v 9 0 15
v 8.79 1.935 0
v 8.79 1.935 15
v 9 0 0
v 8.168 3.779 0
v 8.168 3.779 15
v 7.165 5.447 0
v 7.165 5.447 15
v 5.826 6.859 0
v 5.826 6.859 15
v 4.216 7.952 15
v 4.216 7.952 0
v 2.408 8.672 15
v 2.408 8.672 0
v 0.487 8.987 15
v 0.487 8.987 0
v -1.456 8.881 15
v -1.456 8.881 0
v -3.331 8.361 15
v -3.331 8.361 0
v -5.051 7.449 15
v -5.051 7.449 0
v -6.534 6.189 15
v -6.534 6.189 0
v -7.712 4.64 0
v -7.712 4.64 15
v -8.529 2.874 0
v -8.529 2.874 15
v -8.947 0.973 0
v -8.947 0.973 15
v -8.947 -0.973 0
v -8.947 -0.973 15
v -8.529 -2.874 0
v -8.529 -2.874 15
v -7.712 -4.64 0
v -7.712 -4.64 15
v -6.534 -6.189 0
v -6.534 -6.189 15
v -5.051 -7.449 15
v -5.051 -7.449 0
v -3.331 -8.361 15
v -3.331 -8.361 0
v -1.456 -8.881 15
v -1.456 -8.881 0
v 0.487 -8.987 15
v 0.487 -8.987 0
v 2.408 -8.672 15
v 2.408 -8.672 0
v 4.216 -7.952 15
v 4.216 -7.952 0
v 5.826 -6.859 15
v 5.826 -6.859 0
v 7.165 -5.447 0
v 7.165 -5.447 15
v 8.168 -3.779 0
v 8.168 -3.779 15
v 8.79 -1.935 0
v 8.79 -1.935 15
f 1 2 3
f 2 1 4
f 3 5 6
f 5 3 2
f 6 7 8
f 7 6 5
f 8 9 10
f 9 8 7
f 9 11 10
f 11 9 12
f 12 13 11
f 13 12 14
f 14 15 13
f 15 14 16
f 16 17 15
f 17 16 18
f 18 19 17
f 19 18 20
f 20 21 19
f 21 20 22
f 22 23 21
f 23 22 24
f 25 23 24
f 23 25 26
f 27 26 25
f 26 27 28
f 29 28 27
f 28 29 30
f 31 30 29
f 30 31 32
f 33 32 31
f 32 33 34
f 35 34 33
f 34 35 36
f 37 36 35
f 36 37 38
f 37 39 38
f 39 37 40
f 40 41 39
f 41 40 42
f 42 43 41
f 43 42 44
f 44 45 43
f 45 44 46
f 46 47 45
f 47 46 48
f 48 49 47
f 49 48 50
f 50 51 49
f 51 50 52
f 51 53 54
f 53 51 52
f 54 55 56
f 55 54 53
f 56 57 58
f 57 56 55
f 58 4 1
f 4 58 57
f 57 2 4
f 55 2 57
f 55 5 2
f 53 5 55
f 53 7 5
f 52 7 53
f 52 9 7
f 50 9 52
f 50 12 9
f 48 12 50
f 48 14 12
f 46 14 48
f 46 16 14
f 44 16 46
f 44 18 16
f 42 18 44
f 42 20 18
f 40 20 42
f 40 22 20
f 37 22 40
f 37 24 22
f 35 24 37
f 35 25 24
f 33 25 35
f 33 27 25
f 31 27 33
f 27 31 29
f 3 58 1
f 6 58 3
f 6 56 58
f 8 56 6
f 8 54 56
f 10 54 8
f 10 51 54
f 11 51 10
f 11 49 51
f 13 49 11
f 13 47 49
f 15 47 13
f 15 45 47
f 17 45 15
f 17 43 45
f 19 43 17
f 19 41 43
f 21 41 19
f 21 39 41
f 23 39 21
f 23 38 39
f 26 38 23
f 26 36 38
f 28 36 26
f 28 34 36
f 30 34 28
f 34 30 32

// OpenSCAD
// Generated by SolidPython 1.0.1 on 2020-07-29 00:46:44


cylinder(h = 15, r1 = 9, r2 = 9);
/***********************************************
*********      SolidPython code:      **********
************************************************
 
# import packages: SolidPython
from solid import *
from solid.utils import *
from itertools import chain, combinations, permutations


class Resize:

    def __init__(self, scad_file):
        self.scad_file = scad_file
        #self.scad_file = import_scad(scad_file)
        # cone/cylinder param:
        self.r1 = 0
        self.r2 = 0
        self.h = 0
        # rectangular prism param:
        self.w = 0
        self.l = 0
        # ellipse param:
        self.r = 0

    # import OpenScad code (file name corresponds to shape)


    # classify shape + parameters
    def assign(self, param1, param2, param3):
        if self.scad_file == 'cone.scad':
            self.r1 = param1
            self.r2 = param2
            self.h = param3
        elif self.scad_file == 'cylinder.scad':
            self.r1 = param1
            self.r2 = param2
            self.h = param3
        elif self.scad_file == 'rectangularPrism.scad':
            self.h = param1
            self.l = param2
            self.w = param3
        else:
            self.r = param1
            self.h = param2

    # resize parameters
    def iterate(self):
        x = range(3, 20, 2)
        i = 1
        if self.scad_file == 'cone.scad':
            tempList = list(permutations(x, 2))
            for temp in tempList:
                param1 = temp[0]
                param2 = temp[1]
                filepath = 'produced_scad_files/' + 'cone' + str(param1) + '_' + str(param2) + '_' + '.scad'
                scad_render_to_file(cylinder(h=param1, r1=param2, r2=0), filepath)

        elif self.scad_file == 'cylinder.scad':
            tempList = list(permutations(x, 3))
            for temp in tempList:
                param1 = temp[0]
                param2 = temp[1]
                filepath = 'produced_scad_files/' + 'cylinder' + str(param1) + '_' + str(param2) + '_' + '.scad'
                scad_render_to_file(cylinder(h=param1, r1=param2, r2=param2), filepath)

        elif self.scad_file == 'rectangularPrism.scad':
            tempList = list(permutations(x, 3))
            for temp in tempList:
                param1 = temp[0]
                param2 = temp[1]
                param3 = temp[2]
                filepath = 'produced_scad_files/' + 'rectangularPrism' + str(param1) + '_' + str(param2) + '_' + str(
                    param3) + '.scad'
                scad_render_to_file(cube(size=(param1, param2, param3)), filepath)

        elif self.scad_file == 'ellipse.scad':
            tempList = list(permutations(x, 4))
            for temp in tempList:
                param1 = temp[0]
                param2 = temp[1]
                param3 = temp[2]
                param4 = temp[3]
                filepath = 'produced_scad_files/' + 'ellipse' + str(param1) + '_' + str(param2) + '_' + str(param3) + '_' + str(param4) + '.scad'
                scad_render_to_file(scale([param1, param2, param3])(sphere(r=param4)), filepath)

    def render_to_scadfile(self):
        scad_render_to_file(scad, 'example.scad') 
 
************************************************/
